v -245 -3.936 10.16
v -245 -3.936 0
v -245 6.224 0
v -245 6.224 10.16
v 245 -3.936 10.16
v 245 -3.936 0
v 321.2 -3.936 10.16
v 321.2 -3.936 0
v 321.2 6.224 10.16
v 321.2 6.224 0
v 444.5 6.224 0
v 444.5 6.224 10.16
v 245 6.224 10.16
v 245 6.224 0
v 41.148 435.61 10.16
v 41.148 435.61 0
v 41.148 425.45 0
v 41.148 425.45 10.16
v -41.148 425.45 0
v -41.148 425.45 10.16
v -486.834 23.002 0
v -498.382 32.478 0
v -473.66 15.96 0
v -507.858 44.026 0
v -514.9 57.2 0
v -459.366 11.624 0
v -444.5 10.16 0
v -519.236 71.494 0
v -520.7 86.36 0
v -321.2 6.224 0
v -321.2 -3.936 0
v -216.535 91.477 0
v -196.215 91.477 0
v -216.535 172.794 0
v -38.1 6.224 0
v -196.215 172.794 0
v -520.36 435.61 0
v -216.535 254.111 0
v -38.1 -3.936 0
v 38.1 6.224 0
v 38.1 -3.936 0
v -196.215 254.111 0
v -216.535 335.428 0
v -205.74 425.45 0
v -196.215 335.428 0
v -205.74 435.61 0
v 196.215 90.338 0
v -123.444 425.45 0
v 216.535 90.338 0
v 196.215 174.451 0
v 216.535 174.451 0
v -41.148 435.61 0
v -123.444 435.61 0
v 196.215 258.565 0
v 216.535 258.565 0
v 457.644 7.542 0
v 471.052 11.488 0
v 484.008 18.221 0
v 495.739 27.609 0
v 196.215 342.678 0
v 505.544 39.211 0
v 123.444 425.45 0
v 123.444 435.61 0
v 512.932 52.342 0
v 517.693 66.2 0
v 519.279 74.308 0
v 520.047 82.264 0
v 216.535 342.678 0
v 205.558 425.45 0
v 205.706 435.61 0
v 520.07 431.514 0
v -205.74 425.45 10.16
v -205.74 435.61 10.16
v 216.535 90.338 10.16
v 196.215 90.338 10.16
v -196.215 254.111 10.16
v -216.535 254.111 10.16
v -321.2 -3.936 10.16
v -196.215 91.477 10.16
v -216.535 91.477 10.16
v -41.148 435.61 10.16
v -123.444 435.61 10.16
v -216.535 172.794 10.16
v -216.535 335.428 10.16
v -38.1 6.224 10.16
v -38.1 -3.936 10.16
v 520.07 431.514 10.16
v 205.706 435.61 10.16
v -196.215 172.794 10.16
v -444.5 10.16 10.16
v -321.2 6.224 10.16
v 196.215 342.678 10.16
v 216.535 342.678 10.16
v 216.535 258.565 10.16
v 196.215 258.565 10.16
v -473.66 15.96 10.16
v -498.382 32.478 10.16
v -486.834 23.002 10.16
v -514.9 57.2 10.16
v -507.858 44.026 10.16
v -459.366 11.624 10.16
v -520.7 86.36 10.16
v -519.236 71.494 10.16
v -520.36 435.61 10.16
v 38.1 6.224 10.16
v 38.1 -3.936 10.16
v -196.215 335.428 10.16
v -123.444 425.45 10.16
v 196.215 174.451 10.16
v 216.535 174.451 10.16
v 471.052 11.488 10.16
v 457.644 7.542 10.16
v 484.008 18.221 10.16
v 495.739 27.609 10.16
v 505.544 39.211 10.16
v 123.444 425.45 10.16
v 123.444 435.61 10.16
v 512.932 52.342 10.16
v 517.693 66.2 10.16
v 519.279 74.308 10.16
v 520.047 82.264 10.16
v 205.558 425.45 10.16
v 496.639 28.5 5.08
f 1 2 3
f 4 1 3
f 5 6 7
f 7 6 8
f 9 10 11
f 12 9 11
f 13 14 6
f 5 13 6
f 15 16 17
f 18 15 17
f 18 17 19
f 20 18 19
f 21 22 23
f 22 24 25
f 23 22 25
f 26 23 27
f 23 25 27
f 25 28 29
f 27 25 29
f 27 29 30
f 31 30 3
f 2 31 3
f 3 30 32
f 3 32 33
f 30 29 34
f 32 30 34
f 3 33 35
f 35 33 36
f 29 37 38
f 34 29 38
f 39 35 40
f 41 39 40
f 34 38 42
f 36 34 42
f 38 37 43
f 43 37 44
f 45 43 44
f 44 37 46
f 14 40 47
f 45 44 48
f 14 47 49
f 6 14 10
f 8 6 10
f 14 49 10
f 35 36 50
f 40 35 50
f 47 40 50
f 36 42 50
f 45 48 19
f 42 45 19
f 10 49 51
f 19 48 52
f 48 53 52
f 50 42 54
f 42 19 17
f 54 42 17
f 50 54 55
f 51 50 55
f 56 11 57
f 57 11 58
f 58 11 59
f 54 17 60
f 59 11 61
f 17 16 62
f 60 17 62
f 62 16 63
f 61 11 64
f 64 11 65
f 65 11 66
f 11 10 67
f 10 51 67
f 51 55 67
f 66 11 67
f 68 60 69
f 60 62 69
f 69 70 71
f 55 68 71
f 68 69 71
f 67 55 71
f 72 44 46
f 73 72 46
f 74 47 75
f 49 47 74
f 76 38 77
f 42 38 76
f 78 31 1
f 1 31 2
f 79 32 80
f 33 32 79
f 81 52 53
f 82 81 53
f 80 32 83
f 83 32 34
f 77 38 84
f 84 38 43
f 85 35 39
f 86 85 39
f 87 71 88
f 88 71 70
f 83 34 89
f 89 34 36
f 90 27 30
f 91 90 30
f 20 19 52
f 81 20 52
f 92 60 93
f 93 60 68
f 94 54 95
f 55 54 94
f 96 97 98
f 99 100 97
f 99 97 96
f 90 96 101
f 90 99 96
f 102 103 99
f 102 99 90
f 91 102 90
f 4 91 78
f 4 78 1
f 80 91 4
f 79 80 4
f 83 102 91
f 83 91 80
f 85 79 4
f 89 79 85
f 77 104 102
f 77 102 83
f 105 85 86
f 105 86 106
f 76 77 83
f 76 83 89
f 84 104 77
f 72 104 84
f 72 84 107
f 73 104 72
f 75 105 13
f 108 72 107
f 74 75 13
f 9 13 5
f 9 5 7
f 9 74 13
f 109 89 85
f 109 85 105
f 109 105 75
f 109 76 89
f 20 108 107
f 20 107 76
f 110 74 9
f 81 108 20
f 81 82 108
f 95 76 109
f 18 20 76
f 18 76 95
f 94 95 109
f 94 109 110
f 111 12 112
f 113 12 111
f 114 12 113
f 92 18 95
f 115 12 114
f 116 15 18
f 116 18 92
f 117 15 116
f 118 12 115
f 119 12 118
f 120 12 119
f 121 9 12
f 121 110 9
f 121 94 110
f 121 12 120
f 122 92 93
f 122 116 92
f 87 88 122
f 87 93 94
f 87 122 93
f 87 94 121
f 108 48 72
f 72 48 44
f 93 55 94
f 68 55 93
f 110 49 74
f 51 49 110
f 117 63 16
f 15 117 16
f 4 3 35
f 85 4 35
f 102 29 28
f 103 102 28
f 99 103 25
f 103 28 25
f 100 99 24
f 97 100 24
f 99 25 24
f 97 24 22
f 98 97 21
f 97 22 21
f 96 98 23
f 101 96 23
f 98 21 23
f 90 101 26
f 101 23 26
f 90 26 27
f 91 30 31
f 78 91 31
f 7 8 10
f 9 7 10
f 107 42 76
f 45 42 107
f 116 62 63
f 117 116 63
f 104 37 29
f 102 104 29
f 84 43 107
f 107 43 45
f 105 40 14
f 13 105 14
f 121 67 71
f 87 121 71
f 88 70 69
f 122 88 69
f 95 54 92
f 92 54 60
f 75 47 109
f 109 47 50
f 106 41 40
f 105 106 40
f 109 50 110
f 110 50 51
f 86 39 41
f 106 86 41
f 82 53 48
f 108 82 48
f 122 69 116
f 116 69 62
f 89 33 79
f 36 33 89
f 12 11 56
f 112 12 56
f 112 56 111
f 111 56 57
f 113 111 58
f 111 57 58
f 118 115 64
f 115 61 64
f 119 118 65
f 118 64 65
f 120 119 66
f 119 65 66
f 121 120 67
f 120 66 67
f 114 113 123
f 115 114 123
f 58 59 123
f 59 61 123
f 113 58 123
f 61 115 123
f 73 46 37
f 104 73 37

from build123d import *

# Parameters (mm, degrees)
SKETCH1_W           = 20.32
SKETCH1_H           = 81.316938585
SKETCH1_H_2         = 84.113540858
BOSS_EXTRUDE1_DEPTH = 10.16


with BuildPart() as part:
    # Sketch1 → Boss-Extrude1 (new body)
    # profile 1 of 2: a face of its own
    with BuildSketch(Plane.XY):
        with BuildLine():
            ThreePointArc((-520.699999986, 86.36), (-498.381536717, 32.478463279), (-444.5, 10.16))
            Line((-444.5, 10.16), (-321.2, 6.224098454))
            Line((-321.2, 6.224098454), (-321.2, -3.935901546))
            Line((-321.2, -3.935901546), (-245, -3.935901546))
            Line((-245, -3.935901546), (-245, 6.224098454))
            Line((-245, 6.224098454), (-38.1, 6.224098454))
            Line((-38.1, 6.224098454), (-38.1, -3.935901546))
            Line((-38.1, -3.935901546), (38.1, -3.935901546))
            Line((38.1, -3.935901546), (38.1, 6.224098454))
            Line((38.1, 6.224098454), (245, 6.224098454))
            Line((245, 6.224098454), (245, -3.935901546))
            Line((245, -3.935901546), (321.2, -3.935901546))
            Line((321.2, -3.935901546), (321.2, 6.224098454))
            Line((321.2, 6.224098454), (444.500003861, 6.224098454))
            add(Edge.make_bspline(
                [(444.500003861, 6.224098454), (516.375223264, 6.870661069), (520.046520409, 82.264098454)],
                knots=[3.150157412, 3.150157412, 3.150157412, 4.661289858, 4.661289858, 4.661289858], degree=2, weights=[1, 0.7278834, 1]))
            Line((520.046520409, 82.264098454), (520.070316171, 431.514078957))
            Line((520.070316171, 431.514078957), (205.706405146, 435.61))
            Line((205.706405146, 435.61), (205.558012439, 425.45))
            Line((205.558012439, 425.45), (123.444, 425.45))
            Line((123.444, 425.45), (123.444, 435.61))
            Line((123.444, 435.61), (41.148, 435.61))
            Line((41.148, 435.61), (41.148, 425.45))
            Line((41.148, 425.45), (-41.148, 425.45))
            Line((-41.148, 425.45), (-41.148, 435.61))
            Line((-41.148, 435.61), (-123.444, 435.61))
            Line((-123.444, 435.61), (-123.444, 425.45))
            Line((-123.444, 425.45), (-205.739999986, 425.45))
            Line((-205.739999986, 425.45), (-205.739999986, 388.35))
            Line((-205.739999986, 388.35), (-230.359692704, 388.35))
            Line((-230.359692704, 388.35), (-230.359692704, 435.61))
            Line((-230.359692704, 435.61), (-520.3601107, 435.61))
            Line((-520.3601107, 435.61), (-520.699999986, 86.36))
        make_face()
        with Locations((-206.375268781, 132.135407878)):
            Rectangle(SKETCH1_W, SKETCH1_H, mode=Mode.SUBTRACT)
        with Locations((206.375268781, 132.394409741)):
            Rectangle(SKETCH1_W, SKETCH1_H_2, mode=Mode.SUBTRACT)
        with Locations((-206.375268781, 294.769285048)):
            Rectangle(SKETCH1_W, SKETCH1_H, mode=Mode.SUBTRACT)
        with Locations((206.375268781, 300.621491457)):
            Rectangle(SKETCH1_W, SKETCH1_H_2, mode=Mode.SUBTRACT)
    # profile 2 of 2: a face of its own
    with BuildSketch(Plane.XY):
        Polygon((-205.739999986, 435.61), (-230.359692704, 435.61), (-230.359692704, 388.35), (-205.739999986, 388.35), (-205.739999986, 425.45), align=None)
    extrude(amount=BOSS_EXTRUDE1_DEPTH)


solid = part.part
